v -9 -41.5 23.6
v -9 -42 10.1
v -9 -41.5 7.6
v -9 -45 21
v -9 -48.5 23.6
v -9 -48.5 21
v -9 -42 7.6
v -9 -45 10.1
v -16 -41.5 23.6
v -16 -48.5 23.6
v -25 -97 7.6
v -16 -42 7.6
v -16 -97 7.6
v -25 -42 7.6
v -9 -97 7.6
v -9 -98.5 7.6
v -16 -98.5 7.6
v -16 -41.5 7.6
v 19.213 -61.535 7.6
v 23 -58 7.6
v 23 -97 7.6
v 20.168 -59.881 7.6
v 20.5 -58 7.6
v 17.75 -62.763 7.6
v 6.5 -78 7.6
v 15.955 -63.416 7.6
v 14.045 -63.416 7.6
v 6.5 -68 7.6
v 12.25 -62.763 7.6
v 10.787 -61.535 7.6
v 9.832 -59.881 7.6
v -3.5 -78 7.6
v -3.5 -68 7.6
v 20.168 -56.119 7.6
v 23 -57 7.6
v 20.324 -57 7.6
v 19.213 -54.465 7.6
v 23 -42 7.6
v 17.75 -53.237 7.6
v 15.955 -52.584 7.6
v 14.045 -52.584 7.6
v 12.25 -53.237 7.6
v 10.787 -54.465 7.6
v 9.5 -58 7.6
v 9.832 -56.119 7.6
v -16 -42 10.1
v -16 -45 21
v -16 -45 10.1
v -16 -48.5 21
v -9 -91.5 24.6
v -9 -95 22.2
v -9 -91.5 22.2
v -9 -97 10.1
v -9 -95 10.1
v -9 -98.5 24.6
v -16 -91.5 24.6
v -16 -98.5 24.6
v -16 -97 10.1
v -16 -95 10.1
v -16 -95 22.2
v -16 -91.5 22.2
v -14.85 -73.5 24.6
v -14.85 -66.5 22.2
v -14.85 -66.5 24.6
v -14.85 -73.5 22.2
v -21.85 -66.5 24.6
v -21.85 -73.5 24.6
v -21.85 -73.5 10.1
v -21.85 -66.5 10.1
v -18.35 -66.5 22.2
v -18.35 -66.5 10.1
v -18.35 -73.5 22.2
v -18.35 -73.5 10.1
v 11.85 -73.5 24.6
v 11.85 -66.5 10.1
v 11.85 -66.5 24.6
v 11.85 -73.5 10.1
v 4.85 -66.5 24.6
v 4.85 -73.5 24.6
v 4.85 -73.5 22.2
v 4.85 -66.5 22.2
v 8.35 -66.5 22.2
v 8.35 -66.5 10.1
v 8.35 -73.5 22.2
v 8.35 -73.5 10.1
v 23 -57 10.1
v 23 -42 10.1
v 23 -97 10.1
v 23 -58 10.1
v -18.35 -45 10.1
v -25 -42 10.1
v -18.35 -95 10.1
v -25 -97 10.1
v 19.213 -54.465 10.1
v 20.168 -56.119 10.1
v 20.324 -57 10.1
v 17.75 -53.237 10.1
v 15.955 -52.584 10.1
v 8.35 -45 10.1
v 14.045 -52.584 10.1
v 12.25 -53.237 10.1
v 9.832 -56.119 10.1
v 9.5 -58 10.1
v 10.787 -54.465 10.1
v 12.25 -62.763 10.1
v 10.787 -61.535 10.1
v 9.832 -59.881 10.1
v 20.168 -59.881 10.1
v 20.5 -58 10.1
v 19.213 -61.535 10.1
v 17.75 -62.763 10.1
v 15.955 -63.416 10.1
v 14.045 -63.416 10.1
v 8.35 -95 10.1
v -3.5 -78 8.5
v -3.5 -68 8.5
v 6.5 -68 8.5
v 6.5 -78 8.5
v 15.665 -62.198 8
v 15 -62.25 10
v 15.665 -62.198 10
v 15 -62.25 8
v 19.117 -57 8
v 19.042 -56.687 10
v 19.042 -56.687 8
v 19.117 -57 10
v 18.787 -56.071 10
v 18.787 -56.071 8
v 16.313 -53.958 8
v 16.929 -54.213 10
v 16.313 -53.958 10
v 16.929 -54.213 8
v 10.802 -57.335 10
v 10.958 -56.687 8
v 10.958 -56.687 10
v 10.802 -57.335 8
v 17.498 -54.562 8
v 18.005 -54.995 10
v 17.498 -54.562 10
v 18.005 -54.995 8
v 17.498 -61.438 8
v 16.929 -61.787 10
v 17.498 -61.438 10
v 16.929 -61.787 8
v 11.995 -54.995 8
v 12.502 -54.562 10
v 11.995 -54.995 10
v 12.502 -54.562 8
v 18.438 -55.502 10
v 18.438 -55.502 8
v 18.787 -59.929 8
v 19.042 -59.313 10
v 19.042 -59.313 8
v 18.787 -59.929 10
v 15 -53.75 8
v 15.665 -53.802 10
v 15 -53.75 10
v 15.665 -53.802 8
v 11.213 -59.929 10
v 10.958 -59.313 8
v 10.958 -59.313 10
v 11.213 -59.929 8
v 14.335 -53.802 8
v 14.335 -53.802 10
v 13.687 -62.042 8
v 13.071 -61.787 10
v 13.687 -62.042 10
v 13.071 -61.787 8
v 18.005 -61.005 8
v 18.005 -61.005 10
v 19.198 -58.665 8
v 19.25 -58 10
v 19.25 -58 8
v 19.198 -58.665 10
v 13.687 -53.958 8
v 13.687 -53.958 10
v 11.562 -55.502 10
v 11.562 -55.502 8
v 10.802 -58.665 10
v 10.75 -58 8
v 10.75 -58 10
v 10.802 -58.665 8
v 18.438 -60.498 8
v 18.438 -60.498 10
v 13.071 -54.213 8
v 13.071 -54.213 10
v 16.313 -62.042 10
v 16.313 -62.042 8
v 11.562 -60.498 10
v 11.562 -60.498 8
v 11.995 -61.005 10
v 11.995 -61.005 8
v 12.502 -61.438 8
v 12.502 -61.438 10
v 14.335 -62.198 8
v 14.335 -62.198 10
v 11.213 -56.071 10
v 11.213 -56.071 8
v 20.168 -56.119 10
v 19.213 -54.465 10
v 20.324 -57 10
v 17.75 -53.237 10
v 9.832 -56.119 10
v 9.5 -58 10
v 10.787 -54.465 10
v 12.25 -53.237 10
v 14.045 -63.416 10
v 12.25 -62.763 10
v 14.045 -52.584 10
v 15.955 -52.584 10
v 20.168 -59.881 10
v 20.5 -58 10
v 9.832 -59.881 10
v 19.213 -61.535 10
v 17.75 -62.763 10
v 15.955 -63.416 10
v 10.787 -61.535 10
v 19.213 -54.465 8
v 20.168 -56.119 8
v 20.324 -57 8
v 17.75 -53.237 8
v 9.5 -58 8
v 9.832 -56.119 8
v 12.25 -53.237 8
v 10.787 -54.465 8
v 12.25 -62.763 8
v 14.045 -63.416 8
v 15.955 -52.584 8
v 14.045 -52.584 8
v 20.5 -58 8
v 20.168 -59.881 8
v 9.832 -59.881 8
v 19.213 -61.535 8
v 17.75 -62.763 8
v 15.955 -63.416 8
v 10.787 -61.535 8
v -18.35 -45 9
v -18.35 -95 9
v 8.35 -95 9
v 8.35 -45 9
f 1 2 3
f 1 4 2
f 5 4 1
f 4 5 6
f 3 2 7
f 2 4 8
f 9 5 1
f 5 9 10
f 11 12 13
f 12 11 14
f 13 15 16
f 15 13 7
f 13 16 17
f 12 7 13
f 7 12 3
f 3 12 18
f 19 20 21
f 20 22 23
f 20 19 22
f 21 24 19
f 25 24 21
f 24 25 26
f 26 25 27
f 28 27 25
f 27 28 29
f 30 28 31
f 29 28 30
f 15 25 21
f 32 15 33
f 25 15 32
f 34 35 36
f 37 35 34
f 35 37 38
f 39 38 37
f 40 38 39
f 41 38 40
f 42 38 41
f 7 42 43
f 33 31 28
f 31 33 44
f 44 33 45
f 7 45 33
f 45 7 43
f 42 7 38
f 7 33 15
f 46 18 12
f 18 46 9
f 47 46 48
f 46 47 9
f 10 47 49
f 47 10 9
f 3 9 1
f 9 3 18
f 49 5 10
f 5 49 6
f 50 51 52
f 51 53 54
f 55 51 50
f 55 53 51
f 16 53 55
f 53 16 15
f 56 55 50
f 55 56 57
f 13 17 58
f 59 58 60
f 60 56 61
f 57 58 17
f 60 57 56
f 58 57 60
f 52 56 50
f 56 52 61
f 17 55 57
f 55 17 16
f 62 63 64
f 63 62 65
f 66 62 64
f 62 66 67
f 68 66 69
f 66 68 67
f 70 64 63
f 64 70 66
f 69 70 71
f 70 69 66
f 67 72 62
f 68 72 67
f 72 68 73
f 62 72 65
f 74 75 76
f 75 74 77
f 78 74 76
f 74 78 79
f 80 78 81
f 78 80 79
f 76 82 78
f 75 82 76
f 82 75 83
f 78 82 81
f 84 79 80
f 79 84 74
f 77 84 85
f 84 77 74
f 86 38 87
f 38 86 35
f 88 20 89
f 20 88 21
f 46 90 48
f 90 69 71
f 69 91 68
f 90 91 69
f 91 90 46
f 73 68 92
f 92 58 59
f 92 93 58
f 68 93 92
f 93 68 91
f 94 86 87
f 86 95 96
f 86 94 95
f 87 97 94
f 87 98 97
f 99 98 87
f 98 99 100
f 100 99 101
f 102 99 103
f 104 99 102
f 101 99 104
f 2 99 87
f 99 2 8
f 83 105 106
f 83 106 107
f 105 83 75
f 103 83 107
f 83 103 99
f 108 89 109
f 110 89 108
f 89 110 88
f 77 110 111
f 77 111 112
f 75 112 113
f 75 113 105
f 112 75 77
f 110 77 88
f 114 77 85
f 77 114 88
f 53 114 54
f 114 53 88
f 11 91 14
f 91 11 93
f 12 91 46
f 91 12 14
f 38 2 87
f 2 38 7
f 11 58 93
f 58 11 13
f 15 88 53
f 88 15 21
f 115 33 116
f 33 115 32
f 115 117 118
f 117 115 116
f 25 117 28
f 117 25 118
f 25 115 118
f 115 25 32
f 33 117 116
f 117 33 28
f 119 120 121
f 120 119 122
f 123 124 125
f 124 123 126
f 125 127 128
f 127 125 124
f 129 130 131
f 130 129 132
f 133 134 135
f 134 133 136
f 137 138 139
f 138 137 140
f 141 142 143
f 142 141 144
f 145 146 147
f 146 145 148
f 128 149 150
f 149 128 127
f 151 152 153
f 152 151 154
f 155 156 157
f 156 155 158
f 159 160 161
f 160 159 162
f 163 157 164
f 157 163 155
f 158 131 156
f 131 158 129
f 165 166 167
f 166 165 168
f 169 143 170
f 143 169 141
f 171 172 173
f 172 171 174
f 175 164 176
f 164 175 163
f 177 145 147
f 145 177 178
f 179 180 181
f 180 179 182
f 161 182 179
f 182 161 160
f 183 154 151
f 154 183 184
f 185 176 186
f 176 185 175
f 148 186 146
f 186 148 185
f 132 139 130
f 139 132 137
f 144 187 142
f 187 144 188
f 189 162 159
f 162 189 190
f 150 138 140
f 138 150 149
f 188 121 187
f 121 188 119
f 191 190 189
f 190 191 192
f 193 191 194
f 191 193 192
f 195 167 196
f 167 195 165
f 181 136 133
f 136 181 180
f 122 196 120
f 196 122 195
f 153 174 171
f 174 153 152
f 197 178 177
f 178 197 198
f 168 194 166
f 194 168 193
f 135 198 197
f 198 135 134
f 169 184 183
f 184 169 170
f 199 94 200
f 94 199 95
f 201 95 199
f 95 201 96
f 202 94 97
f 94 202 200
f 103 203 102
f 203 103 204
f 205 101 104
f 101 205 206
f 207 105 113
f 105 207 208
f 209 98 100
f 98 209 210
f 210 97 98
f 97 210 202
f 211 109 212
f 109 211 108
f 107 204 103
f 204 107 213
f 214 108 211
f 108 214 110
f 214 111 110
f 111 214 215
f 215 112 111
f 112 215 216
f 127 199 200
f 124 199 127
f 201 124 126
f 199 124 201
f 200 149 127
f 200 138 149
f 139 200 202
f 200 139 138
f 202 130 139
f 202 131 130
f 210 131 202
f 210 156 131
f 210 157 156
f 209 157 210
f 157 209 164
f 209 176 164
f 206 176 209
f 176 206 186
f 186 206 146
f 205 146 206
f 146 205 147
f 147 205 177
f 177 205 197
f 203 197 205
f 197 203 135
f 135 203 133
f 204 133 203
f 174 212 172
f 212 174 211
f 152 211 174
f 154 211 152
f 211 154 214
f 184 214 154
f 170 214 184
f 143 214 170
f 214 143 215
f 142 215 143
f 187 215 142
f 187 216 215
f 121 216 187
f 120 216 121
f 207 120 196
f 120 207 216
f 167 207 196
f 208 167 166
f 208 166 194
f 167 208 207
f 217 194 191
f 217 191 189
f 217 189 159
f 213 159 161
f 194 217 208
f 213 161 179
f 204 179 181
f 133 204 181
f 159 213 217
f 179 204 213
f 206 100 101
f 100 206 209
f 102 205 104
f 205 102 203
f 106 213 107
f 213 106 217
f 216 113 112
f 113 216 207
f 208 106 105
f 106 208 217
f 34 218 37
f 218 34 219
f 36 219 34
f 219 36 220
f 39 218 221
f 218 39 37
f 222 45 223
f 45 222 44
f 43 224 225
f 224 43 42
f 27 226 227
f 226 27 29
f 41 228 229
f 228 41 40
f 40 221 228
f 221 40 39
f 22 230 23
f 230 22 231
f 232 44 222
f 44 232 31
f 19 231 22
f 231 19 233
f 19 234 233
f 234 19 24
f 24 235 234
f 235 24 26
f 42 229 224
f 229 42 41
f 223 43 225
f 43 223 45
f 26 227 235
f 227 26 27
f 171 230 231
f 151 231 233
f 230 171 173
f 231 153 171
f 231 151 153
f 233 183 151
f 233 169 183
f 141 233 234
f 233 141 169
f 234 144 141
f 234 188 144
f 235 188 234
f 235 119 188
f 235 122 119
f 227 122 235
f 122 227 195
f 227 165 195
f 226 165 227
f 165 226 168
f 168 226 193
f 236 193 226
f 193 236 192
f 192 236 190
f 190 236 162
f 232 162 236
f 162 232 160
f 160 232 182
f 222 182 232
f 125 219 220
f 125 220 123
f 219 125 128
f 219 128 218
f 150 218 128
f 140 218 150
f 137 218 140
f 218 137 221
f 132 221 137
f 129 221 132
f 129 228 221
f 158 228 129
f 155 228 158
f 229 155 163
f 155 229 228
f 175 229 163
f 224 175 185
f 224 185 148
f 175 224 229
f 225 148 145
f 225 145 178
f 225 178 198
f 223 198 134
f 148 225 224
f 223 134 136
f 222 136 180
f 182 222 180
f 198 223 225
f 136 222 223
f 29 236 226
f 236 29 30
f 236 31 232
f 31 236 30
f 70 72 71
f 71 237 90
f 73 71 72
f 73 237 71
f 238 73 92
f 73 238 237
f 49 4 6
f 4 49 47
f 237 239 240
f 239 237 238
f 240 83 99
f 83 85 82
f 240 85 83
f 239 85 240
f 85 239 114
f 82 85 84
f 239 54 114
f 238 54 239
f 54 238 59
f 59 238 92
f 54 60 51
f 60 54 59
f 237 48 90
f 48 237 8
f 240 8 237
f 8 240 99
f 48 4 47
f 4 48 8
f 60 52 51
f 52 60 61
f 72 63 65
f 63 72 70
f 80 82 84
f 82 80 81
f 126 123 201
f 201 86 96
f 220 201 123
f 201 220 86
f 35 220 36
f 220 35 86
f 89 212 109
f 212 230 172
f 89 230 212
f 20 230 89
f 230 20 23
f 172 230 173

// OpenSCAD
module sattelite(){
	translate([20.5/-2,0,0])
		cube([20.5,26,7]);
	translate([20.5-20-2,-2,3.5])
		cube([10,10,4.5]);
	rotate([0,90,0])
		translate([-3.4+2.8/2,22.2-2.8/2,0]){		
			translate([0,0,28/-2])
				cylinder(r=2.8/2,h=28);
			translate([0,0,77/-2])
				cylinder(r=1/2,h=77);
		}
}

module taster(){
	translate([0,0,-20+0.0001])
		cylinder(r=8.5/2,h=20, $fn=40);
	cylinder(r=11/2,h=7);
	translate([0,0,-20+0.0001])
		cylinder(r=11/2,h=18);
}


module 3drradio(){ 
	translate([26.7/-2,0,0])
		cube([26.7,50,12.0]);
	translate([26.7/-2,15,0])
		cube([26.7,35,13.2]);
}

module top_plate(){
	translate([0,0,-1.7])
	linear_extrude(height=1.7)
		import("top_plate.dxf");
}

module parts(){
	color("blue"){
		translate([5,-70,0.5])
			rotate([0,0,180])
				sattelite();
		translate([15,-58,10])
			taster();
		translate([-5,-45,9])
			rotate([0,0,180])
				3drradio();
		top_plate();
		translate([10/-2,-55,-15])
			cube([10,4,20])	;
		translate([-9,-60,-15])
			cube([4,2,20]);		
		translate([-9,-80,-15])
			cube([4,2,20]);		
	}
}

//minkowski(){
//	top_plate();
//	sphere(r=0.5);
//}

module holder(b,t,h){
	translate([b/-2,t/-2,7.6])
		cube([b,t,h]);
}
module top_part(){
	difference(){
		union(){
			translate([-25,-97,7.6])
				cube([48,55,2.5]);
			translate([-5,-45,0]){
					translate([-7.5,0,0])
						holder(b=7,t=7,h=16);
					translate([-7.5,-50,0])
						holder(b=7,t=7,h=17);
					translate([26.7/-2,-25,0])
						holder(b=7,t=7,h=17);
					translate([26.7/2,-25,0])
						holder(b=7,t=7,h=17);
			}
		}
		translate([48-25-8,-97+39,7.6])
			cube([8,1,2.5]);
	parts();
	}
	
}
module bottom_part(){
	difference(){
		union(){
			translate([5,0,0]){			
				translate([80/-2,-97,0])
					cube([80,10,2.5]);
				translate([30/-2,-97,0])
					cube([30,55,2.5]);
				translate([-33,-100,0])
					cube([10,5,14]);
				translate([-33+45,-100,0])
					cube([10,5,14]);
				translate([-2,-43-1,0])
					cube([10,5,14]);
				translate([-2-25,-43-1,0])
					cube([45,5,10]);
				translate([-2-25,-43-1,0])
					cube([5,5,14]);
			}
		}
		rotate([0,0,30])
			translate([35/-2,-122,-0.01])
				cube([35,20,5]);
		parts();
		minkowski(){
			top_part();
			sphere(r=0.8);
		}
		translate([5,-60,-0.01])
			cylinder(r1=3,r2=2,h=2);
	}
	
}
module base_fix(){
	difference(){
		union(){
			translate([50/-2,-75,-3.01])
				cube([50,30,3]);
			translate([5,-60,-0.5])
				cylinder(r1=3,r2=2,h=2);
		}
		minkowski(){
			parts();
			sphere(r=0.5);
		}
	}
}
//base_fix();
top_part();
//bottom_part();
//parts();
//sattelite();
